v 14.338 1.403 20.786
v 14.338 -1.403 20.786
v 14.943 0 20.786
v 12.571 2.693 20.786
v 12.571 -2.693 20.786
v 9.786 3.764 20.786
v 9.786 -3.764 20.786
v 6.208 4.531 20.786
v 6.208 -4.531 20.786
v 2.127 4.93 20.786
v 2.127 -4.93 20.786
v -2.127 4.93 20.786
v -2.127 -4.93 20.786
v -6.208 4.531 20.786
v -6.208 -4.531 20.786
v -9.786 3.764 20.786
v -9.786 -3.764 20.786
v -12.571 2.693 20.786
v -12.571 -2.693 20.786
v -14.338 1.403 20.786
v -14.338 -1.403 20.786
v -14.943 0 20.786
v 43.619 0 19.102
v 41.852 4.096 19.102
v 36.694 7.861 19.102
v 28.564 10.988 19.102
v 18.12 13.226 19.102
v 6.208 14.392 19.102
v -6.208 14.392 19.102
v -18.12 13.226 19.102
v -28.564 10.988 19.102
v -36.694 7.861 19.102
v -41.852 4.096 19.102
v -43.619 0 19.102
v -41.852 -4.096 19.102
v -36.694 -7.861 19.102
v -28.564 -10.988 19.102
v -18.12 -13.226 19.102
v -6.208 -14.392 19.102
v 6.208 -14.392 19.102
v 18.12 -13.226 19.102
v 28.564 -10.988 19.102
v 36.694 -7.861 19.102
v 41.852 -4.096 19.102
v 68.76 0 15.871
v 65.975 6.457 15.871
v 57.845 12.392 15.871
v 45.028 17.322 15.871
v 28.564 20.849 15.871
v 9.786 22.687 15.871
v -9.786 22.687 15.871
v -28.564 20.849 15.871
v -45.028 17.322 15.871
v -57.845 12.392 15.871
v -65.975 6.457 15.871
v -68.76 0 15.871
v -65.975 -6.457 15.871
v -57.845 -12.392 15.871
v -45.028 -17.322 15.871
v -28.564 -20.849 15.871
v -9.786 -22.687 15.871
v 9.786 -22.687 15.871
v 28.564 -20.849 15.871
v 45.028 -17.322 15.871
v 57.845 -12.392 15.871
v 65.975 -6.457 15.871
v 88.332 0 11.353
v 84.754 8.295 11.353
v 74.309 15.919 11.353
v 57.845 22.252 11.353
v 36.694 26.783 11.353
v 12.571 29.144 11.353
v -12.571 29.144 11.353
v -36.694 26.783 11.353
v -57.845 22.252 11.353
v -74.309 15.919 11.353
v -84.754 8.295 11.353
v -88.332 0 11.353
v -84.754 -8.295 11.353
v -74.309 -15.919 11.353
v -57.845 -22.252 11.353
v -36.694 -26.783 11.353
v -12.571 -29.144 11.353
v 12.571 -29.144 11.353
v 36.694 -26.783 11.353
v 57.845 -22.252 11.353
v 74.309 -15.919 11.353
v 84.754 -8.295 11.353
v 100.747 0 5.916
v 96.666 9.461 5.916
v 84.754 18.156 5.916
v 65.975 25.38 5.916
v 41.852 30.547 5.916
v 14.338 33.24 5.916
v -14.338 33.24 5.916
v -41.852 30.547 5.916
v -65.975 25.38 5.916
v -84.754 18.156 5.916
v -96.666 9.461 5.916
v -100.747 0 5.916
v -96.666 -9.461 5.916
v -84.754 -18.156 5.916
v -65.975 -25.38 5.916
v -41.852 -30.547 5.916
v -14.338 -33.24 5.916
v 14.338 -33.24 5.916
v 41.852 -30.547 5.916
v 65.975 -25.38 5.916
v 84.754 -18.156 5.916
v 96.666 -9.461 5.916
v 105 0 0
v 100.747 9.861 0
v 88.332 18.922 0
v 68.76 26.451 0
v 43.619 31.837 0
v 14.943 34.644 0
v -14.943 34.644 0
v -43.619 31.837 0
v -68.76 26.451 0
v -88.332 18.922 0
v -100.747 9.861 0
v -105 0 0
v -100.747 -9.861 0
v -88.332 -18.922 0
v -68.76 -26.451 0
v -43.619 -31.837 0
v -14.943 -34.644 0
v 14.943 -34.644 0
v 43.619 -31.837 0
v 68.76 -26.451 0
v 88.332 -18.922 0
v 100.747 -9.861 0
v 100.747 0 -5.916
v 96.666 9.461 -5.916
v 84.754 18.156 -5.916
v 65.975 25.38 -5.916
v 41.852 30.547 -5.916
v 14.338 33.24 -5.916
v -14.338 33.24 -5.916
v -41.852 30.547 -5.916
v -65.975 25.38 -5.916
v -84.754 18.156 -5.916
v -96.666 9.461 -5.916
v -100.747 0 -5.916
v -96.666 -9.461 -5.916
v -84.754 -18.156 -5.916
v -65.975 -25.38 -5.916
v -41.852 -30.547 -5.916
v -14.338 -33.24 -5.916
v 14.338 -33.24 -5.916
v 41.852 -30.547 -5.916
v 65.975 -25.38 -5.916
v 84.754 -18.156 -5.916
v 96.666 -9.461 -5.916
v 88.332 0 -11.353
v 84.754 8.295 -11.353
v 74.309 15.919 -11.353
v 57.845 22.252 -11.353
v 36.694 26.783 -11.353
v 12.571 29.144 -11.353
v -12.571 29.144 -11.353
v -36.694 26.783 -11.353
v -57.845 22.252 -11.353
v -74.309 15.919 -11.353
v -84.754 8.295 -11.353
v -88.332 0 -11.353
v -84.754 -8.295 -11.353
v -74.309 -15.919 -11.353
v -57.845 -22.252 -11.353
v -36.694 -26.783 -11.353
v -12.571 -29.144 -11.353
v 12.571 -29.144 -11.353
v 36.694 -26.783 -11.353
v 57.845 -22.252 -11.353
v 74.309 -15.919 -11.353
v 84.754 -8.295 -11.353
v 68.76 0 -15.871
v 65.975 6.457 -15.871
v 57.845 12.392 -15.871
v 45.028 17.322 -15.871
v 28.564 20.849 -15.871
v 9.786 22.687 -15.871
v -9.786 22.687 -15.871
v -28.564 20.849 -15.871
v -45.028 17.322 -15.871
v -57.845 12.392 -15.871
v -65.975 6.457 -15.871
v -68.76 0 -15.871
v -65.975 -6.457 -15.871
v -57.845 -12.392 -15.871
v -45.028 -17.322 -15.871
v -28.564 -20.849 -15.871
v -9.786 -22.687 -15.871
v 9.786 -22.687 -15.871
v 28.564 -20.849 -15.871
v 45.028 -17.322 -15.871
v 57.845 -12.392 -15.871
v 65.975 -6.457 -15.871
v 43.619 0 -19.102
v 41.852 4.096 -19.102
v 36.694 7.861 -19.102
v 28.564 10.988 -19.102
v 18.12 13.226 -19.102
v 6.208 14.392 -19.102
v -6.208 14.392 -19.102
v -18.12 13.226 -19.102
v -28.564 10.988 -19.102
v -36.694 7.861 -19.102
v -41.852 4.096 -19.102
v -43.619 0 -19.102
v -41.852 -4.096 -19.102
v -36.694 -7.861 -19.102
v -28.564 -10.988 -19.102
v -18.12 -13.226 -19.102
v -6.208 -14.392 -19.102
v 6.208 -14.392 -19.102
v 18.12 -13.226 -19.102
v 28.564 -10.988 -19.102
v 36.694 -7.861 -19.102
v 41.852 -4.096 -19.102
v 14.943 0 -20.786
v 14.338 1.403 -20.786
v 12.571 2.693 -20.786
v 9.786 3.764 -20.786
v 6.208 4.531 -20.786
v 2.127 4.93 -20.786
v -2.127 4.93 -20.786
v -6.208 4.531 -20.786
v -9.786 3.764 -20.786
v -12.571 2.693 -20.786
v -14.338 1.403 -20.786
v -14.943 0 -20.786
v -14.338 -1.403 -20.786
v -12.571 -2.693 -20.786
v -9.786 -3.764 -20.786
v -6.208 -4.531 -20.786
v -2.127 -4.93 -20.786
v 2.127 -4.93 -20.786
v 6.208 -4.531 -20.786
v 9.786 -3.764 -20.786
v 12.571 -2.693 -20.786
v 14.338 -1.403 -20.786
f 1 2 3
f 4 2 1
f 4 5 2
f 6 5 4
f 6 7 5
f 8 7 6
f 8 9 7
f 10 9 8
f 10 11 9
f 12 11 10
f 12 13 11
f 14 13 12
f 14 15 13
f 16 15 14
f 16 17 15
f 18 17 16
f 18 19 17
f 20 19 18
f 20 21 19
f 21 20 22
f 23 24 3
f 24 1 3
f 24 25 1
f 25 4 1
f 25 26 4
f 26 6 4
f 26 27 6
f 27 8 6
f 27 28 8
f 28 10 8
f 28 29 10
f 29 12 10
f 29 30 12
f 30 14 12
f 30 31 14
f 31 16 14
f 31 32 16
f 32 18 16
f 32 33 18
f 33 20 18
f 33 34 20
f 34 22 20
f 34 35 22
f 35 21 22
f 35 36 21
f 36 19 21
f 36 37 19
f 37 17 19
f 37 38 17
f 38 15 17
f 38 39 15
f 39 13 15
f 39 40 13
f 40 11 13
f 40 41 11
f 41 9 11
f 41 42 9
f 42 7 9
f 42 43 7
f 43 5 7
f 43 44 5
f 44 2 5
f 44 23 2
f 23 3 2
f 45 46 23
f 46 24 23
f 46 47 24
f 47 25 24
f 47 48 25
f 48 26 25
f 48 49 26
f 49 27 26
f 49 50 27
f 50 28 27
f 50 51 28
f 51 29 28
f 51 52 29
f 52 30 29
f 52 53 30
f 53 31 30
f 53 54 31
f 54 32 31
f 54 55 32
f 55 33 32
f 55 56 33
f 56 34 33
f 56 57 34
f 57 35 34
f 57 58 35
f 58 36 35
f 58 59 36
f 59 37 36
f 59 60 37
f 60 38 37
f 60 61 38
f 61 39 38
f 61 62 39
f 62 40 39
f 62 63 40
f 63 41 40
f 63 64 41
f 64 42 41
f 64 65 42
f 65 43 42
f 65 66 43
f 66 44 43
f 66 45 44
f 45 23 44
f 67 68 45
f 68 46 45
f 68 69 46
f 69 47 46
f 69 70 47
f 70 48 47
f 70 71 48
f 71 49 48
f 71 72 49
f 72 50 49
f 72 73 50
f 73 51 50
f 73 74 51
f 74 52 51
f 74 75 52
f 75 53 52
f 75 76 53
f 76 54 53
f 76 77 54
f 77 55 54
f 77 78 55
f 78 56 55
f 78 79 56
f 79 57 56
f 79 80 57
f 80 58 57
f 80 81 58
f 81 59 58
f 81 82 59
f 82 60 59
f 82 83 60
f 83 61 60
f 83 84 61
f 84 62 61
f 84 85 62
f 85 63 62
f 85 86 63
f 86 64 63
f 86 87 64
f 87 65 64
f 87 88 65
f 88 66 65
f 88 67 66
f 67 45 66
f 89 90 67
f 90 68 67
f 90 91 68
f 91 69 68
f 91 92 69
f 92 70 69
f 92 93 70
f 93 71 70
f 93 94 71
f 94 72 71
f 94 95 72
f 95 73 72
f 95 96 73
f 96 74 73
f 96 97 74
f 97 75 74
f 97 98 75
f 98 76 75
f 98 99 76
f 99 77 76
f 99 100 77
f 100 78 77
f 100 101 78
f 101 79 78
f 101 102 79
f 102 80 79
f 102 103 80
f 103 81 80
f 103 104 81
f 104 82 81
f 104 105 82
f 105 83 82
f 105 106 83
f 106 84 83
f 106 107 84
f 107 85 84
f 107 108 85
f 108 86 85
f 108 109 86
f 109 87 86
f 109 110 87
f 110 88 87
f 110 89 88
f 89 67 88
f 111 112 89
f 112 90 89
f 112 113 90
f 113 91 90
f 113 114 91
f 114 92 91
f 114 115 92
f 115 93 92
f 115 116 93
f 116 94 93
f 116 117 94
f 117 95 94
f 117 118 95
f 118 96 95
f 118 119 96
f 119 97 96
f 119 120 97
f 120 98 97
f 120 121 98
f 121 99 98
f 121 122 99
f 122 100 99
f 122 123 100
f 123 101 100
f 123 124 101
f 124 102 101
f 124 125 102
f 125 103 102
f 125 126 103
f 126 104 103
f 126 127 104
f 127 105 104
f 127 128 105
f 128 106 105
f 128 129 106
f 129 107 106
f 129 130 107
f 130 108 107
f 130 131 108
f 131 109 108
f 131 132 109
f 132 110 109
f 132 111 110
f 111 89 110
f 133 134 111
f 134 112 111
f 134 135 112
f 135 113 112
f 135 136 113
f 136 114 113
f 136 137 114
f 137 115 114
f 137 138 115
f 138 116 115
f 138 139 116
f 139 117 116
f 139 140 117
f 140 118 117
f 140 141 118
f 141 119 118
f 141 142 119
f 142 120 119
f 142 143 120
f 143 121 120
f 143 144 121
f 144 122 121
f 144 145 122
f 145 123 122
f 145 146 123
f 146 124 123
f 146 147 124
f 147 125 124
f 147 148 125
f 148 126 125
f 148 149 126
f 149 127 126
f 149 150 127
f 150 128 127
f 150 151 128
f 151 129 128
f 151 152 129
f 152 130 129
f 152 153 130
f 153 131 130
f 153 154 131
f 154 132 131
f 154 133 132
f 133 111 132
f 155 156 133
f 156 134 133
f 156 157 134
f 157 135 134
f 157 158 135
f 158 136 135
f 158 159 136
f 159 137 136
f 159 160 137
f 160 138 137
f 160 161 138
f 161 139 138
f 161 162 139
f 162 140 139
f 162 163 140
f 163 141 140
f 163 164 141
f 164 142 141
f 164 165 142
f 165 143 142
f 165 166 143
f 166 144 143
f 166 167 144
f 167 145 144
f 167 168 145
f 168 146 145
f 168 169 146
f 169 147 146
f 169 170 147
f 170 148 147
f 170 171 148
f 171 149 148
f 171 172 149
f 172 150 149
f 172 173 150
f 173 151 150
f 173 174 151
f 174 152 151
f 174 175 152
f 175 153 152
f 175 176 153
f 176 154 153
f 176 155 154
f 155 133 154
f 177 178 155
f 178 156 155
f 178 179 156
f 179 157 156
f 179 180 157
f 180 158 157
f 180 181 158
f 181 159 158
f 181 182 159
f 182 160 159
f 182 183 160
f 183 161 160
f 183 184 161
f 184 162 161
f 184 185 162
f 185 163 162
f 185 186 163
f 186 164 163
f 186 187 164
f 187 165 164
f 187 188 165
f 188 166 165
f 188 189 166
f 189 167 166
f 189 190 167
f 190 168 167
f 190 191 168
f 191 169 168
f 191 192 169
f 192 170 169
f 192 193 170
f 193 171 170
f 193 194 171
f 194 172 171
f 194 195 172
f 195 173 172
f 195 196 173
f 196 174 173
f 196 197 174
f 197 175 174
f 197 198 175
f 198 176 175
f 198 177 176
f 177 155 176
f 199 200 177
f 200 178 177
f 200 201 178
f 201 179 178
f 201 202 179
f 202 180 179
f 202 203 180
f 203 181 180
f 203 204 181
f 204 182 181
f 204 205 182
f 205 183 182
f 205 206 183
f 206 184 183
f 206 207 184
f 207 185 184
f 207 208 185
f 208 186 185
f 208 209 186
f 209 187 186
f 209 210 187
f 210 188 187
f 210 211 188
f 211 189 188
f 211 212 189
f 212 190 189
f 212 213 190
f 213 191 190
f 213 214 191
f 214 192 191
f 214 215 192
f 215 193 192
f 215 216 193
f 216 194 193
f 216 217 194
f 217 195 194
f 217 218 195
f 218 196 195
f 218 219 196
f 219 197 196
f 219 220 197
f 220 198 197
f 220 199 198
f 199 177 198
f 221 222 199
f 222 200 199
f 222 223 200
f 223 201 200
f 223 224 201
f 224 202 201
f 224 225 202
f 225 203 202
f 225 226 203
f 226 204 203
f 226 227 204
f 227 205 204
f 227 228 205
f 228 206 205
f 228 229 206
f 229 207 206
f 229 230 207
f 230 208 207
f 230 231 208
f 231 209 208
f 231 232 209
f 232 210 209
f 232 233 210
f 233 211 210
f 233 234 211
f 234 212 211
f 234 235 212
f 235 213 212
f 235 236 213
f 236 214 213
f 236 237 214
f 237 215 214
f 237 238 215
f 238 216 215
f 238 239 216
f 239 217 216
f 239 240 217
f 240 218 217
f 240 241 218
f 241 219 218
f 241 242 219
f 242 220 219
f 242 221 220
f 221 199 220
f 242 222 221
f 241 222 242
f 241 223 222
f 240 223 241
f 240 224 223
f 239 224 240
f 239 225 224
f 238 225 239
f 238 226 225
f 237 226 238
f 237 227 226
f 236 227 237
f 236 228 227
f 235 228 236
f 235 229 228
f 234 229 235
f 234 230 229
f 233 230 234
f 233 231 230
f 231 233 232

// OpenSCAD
// Generated by SolidPython 1.0.1 on 2020-07-29 00:46:51


scale(v = [15, 5, 3]) {
	sphere(r = 7);
}
/***********************************************
*********      SolidPython code:      **********
************************************************
 
# import packages: SolidPython
from solid import *
from solid.utils import *
from itertools import chain, combinations, permutations


class Resize:

    def __init__(self, scad_file):
        self.scad_file = scad_file
        #self.scad_file = import_scad(scad_file)
        # cone/cylinder param:
        self.r1 = 0
        self.r2 = 0
        self.h = 0
        # rectangular prism param:
        self.w = 0
        self.l = 0
        # ellipse param:
        self.r = 0

    # import OpenScad code (file name corresponds to shape)


    # classify shape + parameters
    def assign(self, param1, param2, param3):
        if self.scad_file == 'cone.scad':
            self.r1 = param1
            self.r2 = param2
            self.h = param3
        elif self.scad_file == 'cylinder.scad':
            self.r1 = param1
            self.r2 = param2
            self.h = param3
        elif self.scad_file == 'rectangularPrism.scad':
            self.h = param1
            self.l = param2
            self.w = param3
        else:
            self.r = param1
            self.h = param2

    # resize parameters
    def iterate(self):
        x = range(3, 20, 2)
        i = 1
        if self.scad_file == 'cone.scad':
            tempList = list(permutations(x, 2))
            for temp in tempList:
                param1 = temp[0]
                param2 = temp[1]
                filepath = 'produced_scad_files/' + 'cone' + str(param1) + '_' + str(param2) + '_' + '.scad'
                scad_render_to_file(cylinder(h=param1, r1=param2, r2=0), filepath)

        elif self.scad_file == 'cylinder.scad':
            tempList = list(permutations(x, 3))
            for temp in tempList:
                param1 = temp[0]
                param2 = temp[1]
                filepath = 'produced_scad_files/' + 'cylinder' + str(param1) + '_' + str(param2) + '_' + '.scad'
                scad_render_to_file(cylinder(h=param1, r1=param2, r2=param2), filepath)

        elif self.scad_file == 'rectangularPrism.scad':
            tempList = list(permutations(x, 3))
            for temp in tempList:
                param1 = temp[0]
                param2 = temp[1]
                param3 = temp[2]
                filepath = 'produced_scad_files/' + 'rectangularPrism' + str(param1) + '_' + str(param2) + '_' + str(
                    param3) + '.scad'
                scad_render_to_file(cube(size=(param1, param2, param3)), filepath)

        elif self.scad_file == 'ellipse.scad':
            tempList = list(permutations(x, 4))
            for temp in tempList:
                param1 = temp[0]
                param2 = temp[1]
                param3 = temp[2]
                param4 = temp[3]
                filepath = 'produced_scad_files/' + 'ellipse' + str(param1) + '_' + str(param2) + '_' + str(param3) + '_' + str(param4) + '.scad'
                scad_render_to_file(scale([param1, param2, param3])(sphere(r=param4)), filepath)

    def render_to_scadfile(self):
        scad_render_to_file(scad, 'example.scad') 
 
************************************************/
